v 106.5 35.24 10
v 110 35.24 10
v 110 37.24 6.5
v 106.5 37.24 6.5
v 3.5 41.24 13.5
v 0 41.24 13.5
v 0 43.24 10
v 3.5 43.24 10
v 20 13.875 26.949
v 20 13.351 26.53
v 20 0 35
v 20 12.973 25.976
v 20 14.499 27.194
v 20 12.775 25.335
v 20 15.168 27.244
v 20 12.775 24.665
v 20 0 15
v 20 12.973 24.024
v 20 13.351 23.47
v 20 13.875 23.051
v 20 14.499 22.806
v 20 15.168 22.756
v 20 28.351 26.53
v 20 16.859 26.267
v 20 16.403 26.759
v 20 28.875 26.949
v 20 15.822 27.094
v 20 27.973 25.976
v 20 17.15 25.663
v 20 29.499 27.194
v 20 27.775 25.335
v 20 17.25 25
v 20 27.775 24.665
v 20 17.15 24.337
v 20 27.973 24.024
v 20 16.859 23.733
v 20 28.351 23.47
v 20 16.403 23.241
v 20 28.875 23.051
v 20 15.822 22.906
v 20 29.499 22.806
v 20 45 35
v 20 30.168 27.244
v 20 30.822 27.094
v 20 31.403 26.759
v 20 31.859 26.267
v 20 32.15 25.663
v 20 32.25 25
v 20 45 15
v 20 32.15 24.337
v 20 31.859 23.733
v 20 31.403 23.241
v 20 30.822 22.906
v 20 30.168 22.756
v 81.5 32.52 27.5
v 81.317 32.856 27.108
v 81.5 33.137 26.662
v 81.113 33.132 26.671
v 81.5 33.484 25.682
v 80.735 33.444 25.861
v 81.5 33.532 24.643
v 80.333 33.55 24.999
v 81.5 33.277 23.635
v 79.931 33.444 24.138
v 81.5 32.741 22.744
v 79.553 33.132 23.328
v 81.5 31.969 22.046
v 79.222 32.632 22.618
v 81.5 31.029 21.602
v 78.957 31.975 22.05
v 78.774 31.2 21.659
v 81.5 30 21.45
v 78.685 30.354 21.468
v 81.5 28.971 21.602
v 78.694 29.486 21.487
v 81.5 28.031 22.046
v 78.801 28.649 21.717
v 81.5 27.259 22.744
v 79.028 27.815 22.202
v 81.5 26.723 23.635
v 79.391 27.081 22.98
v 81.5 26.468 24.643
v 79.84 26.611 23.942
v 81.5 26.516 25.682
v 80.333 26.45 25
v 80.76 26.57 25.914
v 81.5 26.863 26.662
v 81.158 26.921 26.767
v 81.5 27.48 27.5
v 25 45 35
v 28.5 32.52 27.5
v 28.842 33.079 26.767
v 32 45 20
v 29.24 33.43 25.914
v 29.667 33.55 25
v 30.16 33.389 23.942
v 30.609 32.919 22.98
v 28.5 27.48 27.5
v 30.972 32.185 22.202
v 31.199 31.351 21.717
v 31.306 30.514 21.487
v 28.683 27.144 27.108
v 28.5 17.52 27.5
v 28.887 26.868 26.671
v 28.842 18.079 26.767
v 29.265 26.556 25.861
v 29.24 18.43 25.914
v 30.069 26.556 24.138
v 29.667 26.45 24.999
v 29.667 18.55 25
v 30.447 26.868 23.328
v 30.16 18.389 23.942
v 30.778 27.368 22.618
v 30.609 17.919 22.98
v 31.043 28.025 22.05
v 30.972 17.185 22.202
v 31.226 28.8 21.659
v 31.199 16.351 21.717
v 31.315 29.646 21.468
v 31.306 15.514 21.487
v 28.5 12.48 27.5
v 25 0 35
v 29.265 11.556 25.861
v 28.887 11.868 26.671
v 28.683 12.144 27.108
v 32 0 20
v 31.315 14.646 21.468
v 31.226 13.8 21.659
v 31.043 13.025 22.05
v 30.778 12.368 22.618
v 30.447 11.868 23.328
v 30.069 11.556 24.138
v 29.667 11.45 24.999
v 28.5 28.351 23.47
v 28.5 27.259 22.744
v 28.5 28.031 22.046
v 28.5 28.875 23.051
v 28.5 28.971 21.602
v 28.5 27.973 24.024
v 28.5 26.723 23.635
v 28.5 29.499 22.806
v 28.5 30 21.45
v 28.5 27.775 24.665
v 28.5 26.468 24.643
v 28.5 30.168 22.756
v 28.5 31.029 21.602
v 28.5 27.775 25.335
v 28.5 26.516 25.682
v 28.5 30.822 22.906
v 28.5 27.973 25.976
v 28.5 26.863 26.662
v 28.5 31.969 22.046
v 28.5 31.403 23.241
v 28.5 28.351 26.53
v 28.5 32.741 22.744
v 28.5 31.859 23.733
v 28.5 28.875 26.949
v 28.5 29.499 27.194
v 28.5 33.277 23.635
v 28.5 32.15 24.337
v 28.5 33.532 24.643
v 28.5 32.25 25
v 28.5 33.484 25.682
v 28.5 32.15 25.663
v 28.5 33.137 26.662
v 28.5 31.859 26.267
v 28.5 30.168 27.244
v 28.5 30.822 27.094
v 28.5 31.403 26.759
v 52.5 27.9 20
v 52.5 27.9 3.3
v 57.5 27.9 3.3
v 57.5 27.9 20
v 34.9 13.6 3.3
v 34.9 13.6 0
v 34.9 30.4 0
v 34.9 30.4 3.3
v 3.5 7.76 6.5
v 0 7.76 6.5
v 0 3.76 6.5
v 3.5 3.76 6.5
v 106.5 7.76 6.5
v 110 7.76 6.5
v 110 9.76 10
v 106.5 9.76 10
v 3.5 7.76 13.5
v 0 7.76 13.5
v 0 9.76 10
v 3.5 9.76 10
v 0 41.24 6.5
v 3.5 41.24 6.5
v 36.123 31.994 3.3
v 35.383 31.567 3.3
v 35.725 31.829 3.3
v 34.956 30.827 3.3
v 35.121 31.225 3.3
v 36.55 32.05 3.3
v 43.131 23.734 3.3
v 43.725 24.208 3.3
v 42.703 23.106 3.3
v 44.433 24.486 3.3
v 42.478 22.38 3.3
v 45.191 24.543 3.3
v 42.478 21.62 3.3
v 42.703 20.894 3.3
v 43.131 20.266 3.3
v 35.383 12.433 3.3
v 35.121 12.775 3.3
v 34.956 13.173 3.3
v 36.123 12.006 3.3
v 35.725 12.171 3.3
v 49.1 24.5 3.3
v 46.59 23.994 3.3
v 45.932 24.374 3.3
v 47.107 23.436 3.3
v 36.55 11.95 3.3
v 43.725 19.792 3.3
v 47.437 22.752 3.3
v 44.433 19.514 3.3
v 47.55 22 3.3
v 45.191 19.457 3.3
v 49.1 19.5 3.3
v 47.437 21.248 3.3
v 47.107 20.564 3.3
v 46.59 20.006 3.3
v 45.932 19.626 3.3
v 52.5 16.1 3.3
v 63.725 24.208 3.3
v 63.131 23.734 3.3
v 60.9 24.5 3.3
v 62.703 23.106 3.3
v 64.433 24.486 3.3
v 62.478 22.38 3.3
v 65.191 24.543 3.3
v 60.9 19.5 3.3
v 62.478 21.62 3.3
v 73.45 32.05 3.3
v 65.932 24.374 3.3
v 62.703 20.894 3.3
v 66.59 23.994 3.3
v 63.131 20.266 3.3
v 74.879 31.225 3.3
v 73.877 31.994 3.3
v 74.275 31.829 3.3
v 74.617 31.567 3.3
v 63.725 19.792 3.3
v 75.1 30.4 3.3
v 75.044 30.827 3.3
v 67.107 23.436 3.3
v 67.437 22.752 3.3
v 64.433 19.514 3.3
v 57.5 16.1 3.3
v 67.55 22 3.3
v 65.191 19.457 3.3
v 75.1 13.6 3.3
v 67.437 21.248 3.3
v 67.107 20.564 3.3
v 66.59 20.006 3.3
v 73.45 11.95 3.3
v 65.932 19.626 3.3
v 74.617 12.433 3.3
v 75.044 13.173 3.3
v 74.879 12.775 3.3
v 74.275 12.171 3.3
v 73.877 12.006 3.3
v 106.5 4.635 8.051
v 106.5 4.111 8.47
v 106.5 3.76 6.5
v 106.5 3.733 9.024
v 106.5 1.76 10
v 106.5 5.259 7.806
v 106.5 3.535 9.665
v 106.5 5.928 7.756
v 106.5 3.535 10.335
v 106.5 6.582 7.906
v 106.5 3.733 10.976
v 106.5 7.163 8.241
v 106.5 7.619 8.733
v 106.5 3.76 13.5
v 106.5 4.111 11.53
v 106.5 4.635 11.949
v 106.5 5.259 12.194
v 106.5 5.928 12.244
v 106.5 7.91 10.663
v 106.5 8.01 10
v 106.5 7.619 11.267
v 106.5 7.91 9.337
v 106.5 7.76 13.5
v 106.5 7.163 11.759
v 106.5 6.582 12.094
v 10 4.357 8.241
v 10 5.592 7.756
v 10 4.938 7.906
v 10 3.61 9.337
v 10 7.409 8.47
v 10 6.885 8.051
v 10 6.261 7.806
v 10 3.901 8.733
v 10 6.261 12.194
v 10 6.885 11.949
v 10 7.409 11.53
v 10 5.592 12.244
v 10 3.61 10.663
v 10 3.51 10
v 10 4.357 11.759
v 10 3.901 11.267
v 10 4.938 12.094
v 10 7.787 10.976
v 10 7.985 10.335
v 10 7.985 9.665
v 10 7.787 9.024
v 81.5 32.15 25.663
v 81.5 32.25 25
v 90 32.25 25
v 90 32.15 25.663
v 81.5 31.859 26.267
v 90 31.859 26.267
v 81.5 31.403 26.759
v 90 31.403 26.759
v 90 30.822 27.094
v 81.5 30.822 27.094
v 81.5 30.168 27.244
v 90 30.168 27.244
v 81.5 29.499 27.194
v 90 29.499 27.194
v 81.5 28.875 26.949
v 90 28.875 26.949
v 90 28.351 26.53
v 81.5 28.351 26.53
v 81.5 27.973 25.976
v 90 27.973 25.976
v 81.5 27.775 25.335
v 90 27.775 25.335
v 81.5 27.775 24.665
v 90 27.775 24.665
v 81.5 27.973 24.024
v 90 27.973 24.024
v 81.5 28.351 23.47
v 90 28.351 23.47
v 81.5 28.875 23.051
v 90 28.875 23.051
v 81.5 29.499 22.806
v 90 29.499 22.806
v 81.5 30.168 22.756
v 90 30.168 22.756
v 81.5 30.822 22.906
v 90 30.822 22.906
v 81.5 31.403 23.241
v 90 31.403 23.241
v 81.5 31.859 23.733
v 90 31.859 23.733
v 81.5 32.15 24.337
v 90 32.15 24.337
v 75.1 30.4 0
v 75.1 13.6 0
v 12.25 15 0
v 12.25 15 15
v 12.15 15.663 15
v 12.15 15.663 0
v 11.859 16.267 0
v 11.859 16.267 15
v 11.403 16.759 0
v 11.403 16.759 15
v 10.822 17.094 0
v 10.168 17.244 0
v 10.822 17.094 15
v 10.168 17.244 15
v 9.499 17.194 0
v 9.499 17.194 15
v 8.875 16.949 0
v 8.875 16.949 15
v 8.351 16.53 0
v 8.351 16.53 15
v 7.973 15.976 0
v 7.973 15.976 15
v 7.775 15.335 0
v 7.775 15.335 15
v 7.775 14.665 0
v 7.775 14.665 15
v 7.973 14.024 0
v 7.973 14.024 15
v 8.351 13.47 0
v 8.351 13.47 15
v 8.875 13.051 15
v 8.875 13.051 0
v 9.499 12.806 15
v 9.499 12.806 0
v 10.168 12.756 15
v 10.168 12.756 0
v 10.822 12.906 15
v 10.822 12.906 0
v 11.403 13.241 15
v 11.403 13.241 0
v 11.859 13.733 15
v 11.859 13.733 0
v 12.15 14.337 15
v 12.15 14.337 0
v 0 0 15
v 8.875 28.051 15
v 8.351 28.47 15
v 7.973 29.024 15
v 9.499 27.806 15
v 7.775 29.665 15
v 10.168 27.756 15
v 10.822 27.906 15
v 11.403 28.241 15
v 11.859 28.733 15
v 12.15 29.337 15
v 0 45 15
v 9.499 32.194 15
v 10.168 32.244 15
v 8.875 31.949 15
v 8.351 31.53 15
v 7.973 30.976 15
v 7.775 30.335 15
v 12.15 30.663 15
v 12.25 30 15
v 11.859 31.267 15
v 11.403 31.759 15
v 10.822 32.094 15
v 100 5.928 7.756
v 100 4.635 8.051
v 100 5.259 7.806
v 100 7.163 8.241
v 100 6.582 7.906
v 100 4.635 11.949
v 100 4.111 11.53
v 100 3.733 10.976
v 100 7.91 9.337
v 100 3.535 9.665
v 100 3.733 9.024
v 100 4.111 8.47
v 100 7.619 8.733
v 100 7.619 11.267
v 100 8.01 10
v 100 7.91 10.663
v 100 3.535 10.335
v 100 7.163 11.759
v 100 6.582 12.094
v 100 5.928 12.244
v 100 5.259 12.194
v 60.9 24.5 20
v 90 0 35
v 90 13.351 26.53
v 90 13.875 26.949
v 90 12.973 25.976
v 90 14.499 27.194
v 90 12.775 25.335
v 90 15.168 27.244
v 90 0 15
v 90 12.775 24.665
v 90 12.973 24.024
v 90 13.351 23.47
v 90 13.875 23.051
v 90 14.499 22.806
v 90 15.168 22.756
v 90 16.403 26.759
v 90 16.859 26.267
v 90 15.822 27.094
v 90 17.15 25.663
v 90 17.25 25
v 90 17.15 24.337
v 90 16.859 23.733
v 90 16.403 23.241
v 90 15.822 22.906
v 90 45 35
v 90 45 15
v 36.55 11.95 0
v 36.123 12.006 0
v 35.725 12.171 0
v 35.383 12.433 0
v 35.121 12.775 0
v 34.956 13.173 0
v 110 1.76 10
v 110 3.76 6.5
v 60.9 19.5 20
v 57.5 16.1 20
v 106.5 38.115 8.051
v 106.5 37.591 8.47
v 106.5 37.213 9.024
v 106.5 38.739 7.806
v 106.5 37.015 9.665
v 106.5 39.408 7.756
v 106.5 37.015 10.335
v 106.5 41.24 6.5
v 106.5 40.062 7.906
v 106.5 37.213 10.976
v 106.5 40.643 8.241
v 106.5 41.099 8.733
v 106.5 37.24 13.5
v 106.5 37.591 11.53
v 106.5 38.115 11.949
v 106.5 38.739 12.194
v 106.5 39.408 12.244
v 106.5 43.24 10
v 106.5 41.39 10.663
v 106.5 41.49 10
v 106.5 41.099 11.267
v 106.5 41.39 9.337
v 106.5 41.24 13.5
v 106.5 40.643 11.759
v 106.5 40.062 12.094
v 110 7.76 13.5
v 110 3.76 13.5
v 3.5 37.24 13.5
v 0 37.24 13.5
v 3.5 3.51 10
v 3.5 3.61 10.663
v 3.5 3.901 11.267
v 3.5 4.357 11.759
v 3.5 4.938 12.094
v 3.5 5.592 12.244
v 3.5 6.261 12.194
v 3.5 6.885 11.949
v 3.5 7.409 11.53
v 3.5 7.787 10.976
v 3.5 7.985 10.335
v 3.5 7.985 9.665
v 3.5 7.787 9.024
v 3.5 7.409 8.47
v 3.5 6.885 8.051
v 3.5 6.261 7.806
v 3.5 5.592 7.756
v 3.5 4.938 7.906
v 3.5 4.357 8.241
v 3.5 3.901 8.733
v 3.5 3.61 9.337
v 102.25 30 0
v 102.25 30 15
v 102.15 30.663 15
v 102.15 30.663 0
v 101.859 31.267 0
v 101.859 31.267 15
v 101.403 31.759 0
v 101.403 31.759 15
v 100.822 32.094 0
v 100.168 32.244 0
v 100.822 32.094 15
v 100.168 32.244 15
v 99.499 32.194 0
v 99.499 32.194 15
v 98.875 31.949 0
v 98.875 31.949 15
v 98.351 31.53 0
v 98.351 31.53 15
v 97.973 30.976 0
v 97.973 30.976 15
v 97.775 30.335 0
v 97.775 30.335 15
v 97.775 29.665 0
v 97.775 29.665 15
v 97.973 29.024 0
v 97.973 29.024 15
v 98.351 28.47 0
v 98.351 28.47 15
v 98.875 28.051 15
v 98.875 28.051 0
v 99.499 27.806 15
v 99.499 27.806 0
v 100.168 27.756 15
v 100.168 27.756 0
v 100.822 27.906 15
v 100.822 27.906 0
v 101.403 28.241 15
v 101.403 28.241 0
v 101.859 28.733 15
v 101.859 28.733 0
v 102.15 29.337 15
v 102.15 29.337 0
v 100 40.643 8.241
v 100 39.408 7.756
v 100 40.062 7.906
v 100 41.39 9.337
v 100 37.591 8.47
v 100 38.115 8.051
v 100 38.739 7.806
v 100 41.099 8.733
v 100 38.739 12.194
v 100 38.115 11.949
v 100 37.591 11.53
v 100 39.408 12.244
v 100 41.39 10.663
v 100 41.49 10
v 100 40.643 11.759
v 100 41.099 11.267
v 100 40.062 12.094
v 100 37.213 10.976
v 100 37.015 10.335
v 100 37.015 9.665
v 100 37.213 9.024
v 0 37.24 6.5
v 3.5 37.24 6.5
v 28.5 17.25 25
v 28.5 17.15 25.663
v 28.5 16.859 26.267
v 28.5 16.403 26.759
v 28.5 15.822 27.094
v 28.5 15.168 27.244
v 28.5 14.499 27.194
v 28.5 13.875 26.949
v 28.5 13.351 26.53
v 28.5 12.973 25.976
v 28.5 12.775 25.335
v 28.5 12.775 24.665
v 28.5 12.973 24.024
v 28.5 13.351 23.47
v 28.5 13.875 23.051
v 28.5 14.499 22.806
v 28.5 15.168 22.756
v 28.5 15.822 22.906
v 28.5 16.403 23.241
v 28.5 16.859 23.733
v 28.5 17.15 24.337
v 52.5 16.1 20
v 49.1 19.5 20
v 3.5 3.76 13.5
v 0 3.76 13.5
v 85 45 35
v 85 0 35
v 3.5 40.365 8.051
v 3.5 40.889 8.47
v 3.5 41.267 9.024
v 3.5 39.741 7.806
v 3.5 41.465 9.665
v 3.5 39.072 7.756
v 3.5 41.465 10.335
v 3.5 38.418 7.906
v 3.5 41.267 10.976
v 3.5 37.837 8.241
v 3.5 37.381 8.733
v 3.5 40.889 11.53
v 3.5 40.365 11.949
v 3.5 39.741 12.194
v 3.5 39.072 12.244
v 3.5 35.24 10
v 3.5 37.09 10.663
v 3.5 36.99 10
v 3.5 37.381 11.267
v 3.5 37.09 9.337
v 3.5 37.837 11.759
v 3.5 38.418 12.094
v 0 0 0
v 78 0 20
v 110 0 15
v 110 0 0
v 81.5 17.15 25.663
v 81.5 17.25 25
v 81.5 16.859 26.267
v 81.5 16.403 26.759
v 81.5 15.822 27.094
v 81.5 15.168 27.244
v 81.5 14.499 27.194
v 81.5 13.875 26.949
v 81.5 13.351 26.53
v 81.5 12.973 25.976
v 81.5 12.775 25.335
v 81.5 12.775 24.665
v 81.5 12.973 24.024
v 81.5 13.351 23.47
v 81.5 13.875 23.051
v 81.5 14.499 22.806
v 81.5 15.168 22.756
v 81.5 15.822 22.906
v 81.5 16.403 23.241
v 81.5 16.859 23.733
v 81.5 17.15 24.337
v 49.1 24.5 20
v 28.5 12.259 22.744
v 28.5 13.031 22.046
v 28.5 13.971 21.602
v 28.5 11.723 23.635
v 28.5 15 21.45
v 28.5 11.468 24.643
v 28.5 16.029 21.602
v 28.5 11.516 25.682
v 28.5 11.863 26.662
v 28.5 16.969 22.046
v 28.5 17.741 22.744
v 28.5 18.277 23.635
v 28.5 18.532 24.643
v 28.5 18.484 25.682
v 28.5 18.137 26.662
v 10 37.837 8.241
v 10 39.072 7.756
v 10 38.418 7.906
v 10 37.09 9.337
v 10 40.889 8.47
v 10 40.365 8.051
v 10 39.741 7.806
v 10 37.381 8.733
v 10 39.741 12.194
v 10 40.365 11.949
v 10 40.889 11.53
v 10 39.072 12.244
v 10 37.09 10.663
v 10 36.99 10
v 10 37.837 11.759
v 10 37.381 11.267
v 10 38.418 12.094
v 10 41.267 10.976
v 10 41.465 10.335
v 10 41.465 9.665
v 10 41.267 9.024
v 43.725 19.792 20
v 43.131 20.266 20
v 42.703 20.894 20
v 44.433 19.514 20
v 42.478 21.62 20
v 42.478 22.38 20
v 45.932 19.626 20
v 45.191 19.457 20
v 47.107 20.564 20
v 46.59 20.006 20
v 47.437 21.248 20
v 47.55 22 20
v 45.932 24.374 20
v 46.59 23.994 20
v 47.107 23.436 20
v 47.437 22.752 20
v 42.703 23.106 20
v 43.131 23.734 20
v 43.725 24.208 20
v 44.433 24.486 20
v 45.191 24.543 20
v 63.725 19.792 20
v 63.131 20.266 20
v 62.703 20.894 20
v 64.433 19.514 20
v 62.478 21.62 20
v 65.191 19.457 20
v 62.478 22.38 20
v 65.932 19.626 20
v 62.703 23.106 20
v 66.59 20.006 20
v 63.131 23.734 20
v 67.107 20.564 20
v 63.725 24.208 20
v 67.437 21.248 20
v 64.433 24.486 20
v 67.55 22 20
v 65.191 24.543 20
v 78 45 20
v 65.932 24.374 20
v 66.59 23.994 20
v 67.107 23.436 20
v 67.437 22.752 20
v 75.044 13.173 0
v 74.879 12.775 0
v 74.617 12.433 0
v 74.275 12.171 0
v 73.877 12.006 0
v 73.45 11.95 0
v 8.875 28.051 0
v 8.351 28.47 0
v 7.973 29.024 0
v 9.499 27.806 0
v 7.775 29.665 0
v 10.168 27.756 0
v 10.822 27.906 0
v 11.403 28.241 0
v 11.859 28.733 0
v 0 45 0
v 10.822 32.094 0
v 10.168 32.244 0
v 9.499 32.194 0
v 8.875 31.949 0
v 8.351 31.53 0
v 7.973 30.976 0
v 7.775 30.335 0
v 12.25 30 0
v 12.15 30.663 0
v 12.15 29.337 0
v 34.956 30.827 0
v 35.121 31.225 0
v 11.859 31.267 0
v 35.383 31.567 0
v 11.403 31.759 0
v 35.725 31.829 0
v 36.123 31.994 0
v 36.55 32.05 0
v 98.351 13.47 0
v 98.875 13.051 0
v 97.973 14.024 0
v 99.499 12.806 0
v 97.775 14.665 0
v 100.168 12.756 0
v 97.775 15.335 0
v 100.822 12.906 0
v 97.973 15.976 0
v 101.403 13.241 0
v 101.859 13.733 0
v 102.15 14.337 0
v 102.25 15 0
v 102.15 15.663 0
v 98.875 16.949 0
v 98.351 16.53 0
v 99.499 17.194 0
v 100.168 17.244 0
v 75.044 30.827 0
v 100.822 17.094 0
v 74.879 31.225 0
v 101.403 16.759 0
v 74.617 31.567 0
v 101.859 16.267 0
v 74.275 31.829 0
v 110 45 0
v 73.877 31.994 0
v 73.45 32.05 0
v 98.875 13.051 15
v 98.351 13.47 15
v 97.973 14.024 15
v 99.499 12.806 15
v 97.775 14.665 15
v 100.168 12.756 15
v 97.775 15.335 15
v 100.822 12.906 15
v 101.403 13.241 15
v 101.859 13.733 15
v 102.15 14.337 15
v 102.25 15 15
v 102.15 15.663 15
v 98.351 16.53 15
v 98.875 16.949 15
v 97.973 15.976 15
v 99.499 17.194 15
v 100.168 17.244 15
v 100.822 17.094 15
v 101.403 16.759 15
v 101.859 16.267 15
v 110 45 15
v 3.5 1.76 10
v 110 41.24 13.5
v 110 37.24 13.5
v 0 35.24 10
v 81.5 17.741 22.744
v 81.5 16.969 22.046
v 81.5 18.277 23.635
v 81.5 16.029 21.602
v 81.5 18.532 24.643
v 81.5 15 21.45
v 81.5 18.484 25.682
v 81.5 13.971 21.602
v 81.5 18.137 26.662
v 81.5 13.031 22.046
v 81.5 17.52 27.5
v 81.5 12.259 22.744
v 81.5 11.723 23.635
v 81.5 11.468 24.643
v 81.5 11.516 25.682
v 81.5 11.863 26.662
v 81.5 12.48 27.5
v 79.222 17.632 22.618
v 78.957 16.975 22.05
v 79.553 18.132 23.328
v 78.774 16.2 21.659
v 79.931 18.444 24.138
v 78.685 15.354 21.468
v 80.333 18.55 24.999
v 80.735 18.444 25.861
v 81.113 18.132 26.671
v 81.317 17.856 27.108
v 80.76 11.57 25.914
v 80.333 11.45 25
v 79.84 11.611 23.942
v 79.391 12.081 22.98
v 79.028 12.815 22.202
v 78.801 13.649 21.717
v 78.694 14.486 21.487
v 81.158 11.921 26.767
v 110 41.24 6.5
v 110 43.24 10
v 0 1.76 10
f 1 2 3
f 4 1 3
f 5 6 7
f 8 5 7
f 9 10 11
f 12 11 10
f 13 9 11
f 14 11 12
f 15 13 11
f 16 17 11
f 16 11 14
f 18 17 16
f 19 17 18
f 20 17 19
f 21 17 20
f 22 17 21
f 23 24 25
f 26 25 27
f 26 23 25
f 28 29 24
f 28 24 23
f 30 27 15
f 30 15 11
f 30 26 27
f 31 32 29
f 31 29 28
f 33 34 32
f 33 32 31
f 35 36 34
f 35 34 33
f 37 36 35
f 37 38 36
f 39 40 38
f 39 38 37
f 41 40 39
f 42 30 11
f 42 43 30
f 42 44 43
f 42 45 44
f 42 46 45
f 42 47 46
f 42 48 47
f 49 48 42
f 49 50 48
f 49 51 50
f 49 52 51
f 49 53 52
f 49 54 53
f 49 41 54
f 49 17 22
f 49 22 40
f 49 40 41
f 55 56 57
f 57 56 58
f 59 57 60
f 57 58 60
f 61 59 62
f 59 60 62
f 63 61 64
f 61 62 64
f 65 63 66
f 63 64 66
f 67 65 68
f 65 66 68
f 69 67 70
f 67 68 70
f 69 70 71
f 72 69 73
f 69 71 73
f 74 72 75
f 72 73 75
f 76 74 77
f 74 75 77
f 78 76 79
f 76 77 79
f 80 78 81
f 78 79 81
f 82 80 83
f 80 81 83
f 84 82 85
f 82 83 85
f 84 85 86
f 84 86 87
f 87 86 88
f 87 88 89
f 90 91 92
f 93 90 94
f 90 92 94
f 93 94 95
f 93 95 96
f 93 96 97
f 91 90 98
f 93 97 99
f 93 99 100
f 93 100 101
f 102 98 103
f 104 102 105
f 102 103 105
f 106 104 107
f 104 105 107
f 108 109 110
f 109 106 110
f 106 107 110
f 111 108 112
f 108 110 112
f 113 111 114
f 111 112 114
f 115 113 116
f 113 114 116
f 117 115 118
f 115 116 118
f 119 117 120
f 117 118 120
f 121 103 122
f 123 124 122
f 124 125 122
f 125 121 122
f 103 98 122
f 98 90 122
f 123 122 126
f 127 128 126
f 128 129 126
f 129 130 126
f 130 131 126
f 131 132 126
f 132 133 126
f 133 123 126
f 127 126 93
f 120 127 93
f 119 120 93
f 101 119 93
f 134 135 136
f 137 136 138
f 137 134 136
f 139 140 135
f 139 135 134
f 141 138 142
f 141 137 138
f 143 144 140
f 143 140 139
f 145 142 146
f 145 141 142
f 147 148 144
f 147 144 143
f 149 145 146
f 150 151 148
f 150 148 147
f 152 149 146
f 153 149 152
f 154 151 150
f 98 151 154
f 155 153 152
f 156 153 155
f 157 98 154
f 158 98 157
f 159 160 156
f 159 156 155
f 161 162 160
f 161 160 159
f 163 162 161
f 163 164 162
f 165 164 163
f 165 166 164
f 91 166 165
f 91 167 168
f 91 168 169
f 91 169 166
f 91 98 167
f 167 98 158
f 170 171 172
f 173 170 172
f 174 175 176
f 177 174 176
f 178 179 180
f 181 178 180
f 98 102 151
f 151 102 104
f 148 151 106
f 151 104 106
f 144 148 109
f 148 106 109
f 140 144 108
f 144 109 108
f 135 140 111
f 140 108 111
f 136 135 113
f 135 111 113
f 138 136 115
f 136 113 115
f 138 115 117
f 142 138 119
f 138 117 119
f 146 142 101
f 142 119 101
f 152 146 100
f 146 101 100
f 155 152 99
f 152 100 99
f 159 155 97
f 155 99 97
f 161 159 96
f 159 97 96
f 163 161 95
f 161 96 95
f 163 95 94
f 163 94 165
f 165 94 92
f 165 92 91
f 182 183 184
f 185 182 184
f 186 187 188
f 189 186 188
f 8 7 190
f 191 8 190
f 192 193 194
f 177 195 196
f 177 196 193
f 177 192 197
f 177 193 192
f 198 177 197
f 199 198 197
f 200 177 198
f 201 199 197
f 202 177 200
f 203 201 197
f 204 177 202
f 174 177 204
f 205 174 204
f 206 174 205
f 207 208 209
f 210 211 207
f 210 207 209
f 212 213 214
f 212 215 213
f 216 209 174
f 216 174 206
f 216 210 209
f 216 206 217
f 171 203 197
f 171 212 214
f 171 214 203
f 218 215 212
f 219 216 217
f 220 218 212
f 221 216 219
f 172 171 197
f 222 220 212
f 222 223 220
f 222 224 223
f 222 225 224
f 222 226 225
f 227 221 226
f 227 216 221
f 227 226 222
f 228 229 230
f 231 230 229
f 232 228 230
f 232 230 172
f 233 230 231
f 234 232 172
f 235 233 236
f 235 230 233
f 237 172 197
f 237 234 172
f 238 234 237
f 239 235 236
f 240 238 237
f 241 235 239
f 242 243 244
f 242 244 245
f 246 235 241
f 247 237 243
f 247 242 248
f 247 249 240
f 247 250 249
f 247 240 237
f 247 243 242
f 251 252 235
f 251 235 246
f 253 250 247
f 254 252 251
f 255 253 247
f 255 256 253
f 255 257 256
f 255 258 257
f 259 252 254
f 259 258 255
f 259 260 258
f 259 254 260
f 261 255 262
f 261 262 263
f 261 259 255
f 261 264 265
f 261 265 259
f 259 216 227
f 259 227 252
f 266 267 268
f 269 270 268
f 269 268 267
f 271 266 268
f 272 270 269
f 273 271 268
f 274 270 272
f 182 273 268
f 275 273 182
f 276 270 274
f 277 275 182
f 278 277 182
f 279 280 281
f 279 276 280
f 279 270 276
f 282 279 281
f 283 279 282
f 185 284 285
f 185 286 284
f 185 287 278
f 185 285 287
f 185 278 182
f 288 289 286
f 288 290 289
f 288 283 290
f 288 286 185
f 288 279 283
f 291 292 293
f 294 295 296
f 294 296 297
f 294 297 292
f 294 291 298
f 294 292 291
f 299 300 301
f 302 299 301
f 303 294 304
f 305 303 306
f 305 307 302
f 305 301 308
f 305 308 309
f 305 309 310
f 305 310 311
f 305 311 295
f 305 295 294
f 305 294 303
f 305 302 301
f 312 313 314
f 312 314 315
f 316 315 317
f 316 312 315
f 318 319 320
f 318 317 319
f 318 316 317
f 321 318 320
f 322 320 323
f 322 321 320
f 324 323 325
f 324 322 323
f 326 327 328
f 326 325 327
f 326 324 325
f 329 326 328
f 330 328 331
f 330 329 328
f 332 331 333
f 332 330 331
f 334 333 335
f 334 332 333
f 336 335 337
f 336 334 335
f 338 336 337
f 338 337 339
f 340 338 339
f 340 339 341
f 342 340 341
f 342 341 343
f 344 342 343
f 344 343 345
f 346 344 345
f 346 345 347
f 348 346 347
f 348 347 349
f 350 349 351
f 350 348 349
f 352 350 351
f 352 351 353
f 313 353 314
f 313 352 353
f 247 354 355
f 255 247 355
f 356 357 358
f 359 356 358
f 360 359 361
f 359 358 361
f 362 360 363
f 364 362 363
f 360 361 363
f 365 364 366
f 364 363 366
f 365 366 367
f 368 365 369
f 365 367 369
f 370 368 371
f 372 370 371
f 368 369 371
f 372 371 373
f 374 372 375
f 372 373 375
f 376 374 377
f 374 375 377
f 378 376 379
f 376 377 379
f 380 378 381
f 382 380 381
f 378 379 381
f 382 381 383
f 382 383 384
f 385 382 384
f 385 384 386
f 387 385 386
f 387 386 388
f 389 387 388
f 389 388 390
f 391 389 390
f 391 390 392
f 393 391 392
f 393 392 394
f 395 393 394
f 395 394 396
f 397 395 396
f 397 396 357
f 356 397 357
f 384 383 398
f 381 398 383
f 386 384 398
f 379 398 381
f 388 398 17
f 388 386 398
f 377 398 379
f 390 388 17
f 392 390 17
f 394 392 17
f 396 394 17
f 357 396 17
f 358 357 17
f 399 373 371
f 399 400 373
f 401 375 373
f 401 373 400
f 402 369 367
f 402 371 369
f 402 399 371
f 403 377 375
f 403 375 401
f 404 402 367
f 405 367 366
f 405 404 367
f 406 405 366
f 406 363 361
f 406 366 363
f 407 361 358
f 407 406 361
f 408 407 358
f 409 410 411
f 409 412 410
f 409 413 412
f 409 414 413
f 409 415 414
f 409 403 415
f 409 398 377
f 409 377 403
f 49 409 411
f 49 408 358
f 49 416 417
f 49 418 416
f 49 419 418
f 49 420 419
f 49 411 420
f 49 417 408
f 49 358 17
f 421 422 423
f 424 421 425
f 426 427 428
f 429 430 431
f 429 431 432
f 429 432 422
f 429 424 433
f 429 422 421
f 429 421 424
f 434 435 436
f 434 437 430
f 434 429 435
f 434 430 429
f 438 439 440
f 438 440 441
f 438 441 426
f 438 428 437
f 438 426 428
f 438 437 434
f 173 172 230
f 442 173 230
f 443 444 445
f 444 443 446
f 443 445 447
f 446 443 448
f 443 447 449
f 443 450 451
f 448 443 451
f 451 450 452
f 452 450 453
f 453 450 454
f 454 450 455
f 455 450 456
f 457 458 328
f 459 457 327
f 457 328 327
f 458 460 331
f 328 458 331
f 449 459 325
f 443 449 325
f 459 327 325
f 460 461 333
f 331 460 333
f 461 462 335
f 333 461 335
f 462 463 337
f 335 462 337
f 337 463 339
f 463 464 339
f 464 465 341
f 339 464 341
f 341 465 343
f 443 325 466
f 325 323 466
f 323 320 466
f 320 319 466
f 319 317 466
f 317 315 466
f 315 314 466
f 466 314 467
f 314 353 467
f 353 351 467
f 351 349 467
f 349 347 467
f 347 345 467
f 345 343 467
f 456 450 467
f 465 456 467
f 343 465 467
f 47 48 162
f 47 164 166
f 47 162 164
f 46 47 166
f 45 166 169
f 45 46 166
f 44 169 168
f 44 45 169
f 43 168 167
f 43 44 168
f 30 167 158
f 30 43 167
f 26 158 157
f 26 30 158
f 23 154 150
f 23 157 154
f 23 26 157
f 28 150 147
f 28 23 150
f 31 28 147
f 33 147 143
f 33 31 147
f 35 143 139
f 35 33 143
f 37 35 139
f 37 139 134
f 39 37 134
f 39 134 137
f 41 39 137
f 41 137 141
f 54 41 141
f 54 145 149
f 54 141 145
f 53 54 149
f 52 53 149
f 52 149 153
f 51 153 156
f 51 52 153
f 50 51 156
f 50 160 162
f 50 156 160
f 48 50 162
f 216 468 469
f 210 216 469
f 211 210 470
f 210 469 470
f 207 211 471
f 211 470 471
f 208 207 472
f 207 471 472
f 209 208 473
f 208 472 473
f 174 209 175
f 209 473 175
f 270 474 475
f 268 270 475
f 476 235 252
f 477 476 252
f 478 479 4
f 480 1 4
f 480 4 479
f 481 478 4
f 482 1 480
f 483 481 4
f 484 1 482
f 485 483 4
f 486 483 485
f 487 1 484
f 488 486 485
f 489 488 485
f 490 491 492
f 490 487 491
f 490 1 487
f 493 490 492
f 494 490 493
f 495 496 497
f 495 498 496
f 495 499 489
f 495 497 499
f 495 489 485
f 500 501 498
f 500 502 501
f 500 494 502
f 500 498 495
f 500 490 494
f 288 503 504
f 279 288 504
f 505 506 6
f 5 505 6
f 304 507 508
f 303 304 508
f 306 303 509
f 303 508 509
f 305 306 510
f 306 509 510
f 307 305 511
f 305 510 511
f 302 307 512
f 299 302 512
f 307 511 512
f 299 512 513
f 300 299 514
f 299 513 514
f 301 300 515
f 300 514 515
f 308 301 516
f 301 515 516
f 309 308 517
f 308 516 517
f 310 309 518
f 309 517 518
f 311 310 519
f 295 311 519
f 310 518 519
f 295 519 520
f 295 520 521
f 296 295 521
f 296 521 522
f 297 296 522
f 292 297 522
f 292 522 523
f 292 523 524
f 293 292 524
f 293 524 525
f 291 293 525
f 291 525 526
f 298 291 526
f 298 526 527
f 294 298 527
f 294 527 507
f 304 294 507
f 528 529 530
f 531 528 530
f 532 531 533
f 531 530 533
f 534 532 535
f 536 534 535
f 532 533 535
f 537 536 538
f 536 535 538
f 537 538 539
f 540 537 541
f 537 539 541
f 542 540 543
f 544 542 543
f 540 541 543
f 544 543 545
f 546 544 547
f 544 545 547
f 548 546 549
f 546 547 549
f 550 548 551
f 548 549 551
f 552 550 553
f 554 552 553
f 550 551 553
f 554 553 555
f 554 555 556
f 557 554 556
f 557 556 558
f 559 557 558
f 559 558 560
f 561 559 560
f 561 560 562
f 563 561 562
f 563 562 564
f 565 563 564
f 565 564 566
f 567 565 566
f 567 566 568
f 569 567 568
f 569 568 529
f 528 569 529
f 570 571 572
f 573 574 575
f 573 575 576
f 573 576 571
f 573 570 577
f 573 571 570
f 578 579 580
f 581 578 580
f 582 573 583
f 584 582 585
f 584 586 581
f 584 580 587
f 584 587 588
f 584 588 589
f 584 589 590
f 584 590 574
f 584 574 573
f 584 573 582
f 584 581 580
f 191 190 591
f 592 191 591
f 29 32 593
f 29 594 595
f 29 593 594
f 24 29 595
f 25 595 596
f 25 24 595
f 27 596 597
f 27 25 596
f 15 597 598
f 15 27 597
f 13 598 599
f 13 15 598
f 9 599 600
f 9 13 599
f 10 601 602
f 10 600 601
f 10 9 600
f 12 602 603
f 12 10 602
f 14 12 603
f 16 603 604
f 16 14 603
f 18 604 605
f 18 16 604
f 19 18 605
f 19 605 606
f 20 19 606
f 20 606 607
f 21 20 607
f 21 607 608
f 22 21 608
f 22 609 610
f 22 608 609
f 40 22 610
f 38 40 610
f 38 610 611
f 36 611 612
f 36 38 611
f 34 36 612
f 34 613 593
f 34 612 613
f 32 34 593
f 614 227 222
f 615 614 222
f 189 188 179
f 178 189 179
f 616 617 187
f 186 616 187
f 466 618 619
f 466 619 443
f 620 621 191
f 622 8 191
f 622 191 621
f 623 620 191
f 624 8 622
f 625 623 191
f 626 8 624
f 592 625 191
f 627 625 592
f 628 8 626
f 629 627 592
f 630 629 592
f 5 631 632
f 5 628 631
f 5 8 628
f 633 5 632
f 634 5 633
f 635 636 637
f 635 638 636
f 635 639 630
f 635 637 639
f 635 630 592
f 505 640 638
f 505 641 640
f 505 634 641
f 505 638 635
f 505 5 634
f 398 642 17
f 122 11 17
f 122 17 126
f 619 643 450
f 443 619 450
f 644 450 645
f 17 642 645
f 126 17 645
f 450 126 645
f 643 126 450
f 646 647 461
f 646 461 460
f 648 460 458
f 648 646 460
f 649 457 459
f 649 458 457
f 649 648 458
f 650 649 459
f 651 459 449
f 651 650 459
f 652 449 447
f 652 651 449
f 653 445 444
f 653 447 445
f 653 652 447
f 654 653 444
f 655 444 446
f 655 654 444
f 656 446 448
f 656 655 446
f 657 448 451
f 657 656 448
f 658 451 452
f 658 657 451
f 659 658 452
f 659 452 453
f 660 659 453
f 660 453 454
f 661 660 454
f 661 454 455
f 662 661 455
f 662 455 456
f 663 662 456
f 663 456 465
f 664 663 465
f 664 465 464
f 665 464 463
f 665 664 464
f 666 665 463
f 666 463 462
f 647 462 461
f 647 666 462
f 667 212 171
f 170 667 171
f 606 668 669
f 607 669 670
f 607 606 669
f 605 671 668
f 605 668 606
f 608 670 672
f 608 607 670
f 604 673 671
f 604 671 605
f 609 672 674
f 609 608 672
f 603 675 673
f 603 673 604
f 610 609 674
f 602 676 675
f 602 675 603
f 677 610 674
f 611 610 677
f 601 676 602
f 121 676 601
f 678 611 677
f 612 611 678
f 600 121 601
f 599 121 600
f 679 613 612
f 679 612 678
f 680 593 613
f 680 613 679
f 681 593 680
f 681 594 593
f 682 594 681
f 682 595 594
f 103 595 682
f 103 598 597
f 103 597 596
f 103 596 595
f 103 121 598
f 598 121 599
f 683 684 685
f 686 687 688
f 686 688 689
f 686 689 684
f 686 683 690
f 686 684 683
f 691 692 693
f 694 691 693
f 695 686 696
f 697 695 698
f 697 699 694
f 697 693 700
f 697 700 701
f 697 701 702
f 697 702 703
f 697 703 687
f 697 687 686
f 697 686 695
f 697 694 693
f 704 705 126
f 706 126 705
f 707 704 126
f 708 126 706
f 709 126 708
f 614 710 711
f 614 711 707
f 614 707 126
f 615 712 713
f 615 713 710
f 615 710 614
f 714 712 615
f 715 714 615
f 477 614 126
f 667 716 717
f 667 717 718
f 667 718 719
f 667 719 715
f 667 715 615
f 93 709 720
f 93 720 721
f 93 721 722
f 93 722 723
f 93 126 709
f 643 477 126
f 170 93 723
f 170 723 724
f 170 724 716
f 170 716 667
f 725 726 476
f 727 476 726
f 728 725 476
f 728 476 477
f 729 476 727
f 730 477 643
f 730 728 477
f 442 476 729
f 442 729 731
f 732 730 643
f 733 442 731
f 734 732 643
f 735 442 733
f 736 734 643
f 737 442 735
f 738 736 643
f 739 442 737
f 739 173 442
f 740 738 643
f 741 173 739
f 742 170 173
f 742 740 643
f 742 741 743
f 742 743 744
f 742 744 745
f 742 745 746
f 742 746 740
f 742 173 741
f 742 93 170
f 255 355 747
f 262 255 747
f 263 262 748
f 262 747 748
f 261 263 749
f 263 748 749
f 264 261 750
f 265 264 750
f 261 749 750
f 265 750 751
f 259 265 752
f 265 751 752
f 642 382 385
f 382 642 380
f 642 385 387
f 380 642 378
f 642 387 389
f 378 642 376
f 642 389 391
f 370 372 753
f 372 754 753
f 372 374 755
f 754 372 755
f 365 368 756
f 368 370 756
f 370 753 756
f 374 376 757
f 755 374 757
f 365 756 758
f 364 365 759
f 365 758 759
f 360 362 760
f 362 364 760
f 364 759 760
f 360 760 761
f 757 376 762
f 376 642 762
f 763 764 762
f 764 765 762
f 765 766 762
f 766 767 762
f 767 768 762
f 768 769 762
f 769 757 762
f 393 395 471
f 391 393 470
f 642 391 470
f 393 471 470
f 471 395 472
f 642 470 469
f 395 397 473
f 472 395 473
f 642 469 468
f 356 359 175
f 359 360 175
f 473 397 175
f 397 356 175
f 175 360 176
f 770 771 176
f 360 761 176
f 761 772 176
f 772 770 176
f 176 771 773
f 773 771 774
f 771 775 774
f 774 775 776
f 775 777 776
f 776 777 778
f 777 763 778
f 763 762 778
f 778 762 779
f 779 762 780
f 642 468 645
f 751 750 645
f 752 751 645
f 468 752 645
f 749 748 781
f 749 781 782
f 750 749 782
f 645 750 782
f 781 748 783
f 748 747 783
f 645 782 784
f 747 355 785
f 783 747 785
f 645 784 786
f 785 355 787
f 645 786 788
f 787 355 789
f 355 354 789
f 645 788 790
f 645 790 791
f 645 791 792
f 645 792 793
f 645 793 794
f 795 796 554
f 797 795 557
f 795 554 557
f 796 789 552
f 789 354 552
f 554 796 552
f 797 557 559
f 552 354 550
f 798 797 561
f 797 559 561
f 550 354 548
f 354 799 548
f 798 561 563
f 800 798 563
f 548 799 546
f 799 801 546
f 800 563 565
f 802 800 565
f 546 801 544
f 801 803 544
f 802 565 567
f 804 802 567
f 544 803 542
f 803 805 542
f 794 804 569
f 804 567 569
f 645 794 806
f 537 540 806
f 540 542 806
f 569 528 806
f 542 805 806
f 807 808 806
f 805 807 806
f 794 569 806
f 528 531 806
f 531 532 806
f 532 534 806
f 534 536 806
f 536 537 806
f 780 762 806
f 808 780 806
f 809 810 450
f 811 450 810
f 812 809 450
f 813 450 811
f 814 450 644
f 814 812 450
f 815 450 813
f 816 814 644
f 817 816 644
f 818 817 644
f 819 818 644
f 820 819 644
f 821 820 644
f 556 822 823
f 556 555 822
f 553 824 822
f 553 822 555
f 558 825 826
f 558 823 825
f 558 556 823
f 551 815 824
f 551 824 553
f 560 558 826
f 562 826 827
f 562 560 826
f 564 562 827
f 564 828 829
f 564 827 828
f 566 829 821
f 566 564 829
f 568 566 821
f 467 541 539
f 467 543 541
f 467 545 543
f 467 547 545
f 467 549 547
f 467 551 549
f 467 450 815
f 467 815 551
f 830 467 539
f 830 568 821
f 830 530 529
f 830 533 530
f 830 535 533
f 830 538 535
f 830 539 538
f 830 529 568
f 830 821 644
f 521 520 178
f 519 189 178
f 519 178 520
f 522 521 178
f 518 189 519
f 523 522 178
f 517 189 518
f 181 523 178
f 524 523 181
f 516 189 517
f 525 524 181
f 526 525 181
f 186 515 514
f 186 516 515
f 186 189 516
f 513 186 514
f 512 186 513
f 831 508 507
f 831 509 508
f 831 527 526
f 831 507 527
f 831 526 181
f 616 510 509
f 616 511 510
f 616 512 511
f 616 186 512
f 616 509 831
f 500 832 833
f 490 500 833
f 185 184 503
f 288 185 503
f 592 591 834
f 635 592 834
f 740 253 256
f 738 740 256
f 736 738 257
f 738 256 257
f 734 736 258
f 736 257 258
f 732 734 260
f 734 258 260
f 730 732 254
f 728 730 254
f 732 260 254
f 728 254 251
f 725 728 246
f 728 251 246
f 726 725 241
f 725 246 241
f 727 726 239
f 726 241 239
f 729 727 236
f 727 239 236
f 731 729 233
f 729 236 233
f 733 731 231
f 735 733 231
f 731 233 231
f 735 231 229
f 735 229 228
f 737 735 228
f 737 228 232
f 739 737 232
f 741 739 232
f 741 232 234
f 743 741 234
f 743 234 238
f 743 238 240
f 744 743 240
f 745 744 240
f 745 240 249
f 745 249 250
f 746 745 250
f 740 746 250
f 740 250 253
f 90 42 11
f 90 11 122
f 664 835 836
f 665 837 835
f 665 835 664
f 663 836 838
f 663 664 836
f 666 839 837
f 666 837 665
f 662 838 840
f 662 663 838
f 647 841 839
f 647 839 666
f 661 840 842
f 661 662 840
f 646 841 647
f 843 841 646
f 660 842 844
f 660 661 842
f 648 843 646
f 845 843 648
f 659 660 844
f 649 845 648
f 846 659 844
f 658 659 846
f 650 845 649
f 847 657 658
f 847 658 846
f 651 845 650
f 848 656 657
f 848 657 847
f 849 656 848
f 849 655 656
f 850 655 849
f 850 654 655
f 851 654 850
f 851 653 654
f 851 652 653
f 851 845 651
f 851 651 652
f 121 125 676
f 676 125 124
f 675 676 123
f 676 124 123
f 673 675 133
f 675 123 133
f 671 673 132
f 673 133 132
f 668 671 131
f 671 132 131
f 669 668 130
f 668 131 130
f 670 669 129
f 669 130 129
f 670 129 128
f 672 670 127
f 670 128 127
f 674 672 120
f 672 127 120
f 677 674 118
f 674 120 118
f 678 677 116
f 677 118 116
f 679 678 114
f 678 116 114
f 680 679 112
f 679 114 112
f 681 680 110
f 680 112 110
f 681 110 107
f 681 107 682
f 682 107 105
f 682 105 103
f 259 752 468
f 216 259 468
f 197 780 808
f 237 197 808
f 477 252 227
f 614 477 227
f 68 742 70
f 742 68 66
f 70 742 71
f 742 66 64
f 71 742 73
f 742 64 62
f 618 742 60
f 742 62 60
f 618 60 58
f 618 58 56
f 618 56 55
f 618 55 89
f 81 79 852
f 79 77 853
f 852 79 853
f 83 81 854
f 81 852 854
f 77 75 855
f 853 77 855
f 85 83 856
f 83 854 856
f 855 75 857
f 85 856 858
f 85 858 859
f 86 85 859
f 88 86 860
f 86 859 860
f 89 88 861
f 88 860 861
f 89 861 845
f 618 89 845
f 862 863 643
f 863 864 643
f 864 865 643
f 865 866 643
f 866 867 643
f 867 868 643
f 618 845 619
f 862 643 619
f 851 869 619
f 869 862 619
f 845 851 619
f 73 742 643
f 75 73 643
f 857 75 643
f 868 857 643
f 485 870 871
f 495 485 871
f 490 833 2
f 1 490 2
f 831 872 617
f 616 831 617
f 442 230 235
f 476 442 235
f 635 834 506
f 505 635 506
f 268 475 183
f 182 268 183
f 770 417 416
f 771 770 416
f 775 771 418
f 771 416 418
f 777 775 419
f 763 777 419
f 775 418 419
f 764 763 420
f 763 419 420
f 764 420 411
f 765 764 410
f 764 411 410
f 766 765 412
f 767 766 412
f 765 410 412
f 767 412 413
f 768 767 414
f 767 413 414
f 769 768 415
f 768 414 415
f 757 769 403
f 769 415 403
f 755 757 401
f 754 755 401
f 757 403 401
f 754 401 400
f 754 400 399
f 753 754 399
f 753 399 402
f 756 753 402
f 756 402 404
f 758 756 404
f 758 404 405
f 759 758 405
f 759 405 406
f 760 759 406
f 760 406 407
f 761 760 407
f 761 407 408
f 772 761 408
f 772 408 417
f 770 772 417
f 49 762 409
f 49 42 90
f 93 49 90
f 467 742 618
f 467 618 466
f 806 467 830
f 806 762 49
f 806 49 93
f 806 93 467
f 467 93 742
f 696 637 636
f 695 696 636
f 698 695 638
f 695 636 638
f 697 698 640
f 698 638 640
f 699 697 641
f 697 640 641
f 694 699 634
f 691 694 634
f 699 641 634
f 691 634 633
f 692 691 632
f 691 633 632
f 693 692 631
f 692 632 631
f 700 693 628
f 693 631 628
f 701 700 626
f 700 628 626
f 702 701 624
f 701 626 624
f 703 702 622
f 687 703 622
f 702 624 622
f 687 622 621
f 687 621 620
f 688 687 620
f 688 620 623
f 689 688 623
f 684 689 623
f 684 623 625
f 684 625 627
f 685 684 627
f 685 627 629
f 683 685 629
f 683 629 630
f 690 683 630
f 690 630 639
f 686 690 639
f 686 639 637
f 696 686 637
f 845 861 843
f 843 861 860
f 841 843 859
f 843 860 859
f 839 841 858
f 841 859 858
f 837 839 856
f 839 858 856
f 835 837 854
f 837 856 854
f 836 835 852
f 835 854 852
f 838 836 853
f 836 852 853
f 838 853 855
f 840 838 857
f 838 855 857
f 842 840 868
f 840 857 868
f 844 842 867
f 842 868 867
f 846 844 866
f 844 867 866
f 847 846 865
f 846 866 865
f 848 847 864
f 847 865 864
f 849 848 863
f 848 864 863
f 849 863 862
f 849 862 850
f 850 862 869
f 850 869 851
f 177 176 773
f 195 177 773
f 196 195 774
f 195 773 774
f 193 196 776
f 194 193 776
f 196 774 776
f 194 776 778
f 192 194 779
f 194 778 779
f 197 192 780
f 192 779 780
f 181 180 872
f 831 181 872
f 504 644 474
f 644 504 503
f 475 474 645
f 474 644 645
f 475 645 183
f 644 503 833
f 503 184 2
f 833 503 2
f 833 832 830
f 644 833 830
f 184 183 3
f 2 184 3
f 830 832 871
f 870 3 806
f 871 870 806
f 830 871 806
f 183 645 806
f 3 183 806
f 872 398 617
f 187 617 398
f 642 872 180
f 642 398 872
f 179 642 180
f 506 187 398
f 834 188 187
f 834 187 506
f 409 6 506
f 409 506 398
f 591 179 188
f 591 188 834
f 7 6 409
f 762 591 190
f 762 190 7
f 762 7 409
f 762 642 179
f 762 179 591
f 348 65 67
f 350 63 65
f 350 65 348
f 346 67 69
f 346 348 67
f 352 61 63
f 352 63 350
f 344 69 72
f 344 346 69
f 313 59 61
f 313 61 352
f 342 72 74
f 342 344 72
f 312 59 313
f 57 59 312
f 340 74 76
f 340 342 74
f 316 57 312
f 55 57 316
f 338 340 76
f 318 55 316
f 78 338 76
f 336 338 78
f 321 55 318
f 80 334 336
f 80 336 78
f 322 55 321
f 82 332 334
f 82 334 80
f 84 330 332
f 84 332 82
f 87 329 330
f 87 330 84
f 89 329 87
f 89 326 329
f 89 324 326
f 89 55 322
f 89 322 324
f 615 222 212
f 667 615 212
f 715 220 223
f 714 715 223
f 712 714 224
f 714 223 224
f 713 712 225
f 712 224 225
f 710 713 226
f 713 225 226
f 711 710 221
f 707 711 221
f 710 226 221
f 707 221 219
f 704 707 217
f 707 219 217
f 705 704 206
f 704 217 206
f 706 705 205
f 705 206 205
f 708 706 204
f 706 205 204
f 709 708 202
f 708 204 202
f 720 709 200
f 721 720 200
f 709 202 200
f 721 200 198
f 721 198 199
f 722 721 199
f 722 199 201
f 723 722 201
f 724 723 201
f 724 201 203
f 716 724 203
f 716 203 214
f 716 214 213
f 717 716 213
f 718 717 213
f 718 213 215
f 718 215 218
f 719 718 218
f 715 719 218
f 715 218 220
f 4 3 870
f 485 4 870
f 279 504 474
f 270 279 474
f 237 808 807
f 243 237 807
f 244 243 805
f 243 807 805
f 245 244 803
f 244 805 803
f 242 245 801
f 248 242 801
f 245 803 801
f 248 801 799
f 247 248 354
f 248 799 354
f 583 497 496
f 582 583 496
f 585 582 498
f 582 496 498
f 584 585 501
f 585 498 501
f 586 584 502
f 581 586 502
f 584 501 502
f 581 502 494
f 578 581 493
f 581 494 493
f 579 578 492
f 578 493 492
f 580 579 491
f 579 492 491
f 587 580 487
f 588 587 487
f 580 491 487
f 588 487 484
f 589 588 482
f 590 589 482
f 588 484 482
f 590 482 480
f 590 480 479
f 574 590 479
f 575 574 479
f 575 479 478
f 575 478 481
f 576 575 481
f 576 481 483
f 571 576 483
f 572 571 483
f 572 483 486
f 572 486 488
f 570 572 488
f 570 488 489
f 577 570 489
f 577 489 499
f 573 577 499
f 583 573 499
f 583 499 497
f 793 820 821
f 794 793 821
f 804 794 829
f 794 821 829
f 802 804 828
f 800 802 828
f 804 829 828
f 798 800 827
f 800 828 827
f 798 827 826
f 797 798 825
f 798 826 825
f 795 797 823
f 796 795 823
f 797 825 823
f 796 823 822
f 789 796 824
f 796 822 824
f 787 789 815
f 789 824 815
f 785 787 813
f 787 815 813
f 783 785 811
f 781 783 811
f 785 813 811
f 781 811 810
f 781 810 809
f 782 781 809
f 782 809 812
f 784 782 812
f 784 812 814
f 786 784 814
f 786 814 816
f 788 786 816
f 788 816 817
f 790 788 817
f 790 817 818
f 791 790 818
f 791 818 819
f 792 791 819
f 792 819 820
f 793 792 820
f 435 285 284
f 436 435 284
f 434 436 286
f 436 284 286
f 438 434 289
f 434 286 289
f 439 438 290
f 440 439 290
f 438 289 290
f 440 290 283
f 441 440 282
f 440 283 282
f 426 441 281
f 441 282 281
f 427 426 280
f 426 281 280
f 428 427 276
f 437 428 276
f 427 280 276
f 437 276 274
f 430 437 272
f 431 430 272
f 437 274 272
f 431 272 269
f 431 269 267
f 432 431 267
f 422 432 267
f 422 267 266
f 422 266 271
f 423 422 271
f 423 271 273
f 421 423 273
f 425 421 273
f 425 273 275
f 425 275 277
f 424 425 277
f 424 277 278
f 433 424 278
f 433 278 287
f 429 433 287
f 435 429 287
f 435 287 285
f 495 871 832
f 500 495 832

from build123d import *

# Parameters (mm, degrees)
F0_W      = 110
F0_H      = 45
F1_DEPTH  = 15
F2_W      = 12
F2_H      = 45
F3_DEPTH  = 20
F4_R      = 2.25
F5_DEPTH  = 110.001
F6_R      = 2.25
F7_DEPTH  = 15.001
F8_R      = 2.25
F9_DEPTH  = 15.001
F10_R     = 3.55
F11_DEPTH = 3.5
F12_R     = 3.55
F13_DEPTH = 3.5
F3_FACE_W = 46
F3_FACE_H = 45
F14_DEPTH = 5
F16_DEPTH = 45.001
F17_R     = 2.55
F18_DEPTH = 35.001
F20_DEPTH = 3.3
F21_R     = 2.25
F22_DEPTH = 10
F24_DEPTH = 3.5
F25_R     = 2.25
F26_DEPTH = 10
F28_DEPTH = 3.5


with BuildPart() as f1:
    # F0 (on Top) → F1 (new body)
    with BuildSketch(Plane.XY):
        with Locations((55, 22.5)):
            Rectangle(F0_W, F0_H)
    extrude(amount=F1_DEPTH)

    # F2 (on face) → F3 (join)
    with BuildSketch(Plane.XY.offset(15)):
        with Locations((26, 22.5)):
            Rectangle(F2_W, F2_H)
        with Locations((84, 22.5)):
            Rectangle(F2_W, F2_H)
    extrude(amount=F3_DEPTH)

    # F4 (on Right) → F5 (cut, through all)
    with BuildSketch(Plane.YZ):
        with Locations((15, 25)):
            Circle(F4_R)
        with Locations((30, 25)):
            Circle(F4_R)
    extrude(amount=F5_DEPTH, mode=Mode.SUBTRACT)

    # F6 (on face) → F7 (cut, through all)
    with BuildSketch(Plane.XY.offset(15)):
        with Locations((10, 30)):
            Circle(F6_R)
        with Locations((10, 15)):
            Circle(F6_R)
    extrude(amount=-F7_DEPTH, mode=Mode.SUBTRACT)

    # F8 (on face) → F9 (cut, through all)
    with BuildSketch(Plane.XY.offset(15)):
        with Locations((100, 30)):
            Circle(F8_R)
        with Locations((100, 15)):
            Circle(F8_R)
    extrude(amount=-F9_DEPTH, mode=Mode.SUBTRACT)

    # F10 (on face) → F11 (cut)
    with BuildSketch(Plane(origin=(78, 0, 0), x_dir=(0, -1, 0), z_dir=(-1, 0, 0))):
        with Locations((-30, 25)):
            Circle(F10_R)
        with Locations((-15, 25)):
            Circle(F10_R)
    extrude(amount=-F11_DEPTH, mode=Mode.SUBTRACT)

    # F12 (on face) → F13 (cut)
    with BuildSketch(Plane.YZ.offset(32)):
        with Locations((15, 25)):
            Circle(F12_R)
        with Locations((30, 25)):
            Circle(F12_R)
    extrude(amount=-F13_DEPTH, mode=Mode.SUBTRACT)

    # F3_face (on face) → F14 (join)
    with BuildSketch(Plane(origin=(55, 22.5, 15), x_dir=(1, 0, 0), z_dir=(0, 0, 1))):
        Rectangle(F3_FACE_W, F3_FACE_H)
    extrude(amount=F14_DEPTH)

    # F15 (on face) → F16 (cut, through all)
    with BuildSketch(Plane.XZ):
        Polygon((32, 20), (32, 35), (25, 35), align=None)
        Polygon((85, 35), (78, 35), (78, 20), align=None)
    extrude(amount=-F16_DEPTH, mode=Mode.SUBTRACT)

    # F17 (on face) → F18 (cut, through all)
    with BuildSketch(Plane(origin=(0, 0, 0), x_dir=(1, 0, 0), z_dir=(0, 0, -1))):
        Polygon((57.5, -16.1), (55, -16.1), (52.5, -16.1), (49.1, -19.5), (49.1, -22), (49.1, -24.5), (52.5, -27.9), (55, -27.9), (57.5, -27.9), (60.9, -24.5), (60.9, -22), (60.9, -19.5), align=None)
        with Locations((45, -22)):
            Circle(F17_R)
        with Locations((65, -22)):
            Circle(F17_R)
    extrude(amount=-F18_DEPTH, mode=Mode.SUBTRACT)

    # F19 (on face) → F20 (cut)
    with BuildSketch(Plane(origin=(0, 0, 0), x_dir=(1, 0, 0), z_dir=(0, 0, -1))):
        with BuildLine():
            Line((73.45, -11.95), (55, -11.95))
            Line((55, -11.95), (36.55, -11.95))
            ThreePointArc((36.55, -11.95), (35.383274, -12.433274), (34.9, -13.6))
            Line((34.9, -13.6), (34.9, -30.4))
            ThreePointArc((34.9, -30.4), (35.383274, -31.566726), (36.55, -32.05))
            Line((36.55, -32.05), (73.45, -32.05))
            ThreePointArc((73.45, -32.05), (74.616726, -31.566726), (75.1, -30.4))
            Line((75.1, -30.4), (75.1, -13.6))
            ThreePointArc((75.1, -13.6), (74.616726, -12.433274), (73.45, -11.95))
        make_face()
    extrude(amount=-F20_DEPTH, mode=Mode.SUBTRACT)

    # F21 (on face) → F22 (cut)
    with BuildSketch(Plane(origin=(0, 0, 0), x_dir=(0, -1, 0), z_dir=(-1, 0, 0))):
        with Locations((-39.24, 10)):
            Circle(F21_R)
        with Locations((-5.76, 10)):
            Circle(F21_R)
    extrude(amount=-F22_DEPTH, mode=Mode.SUBTRACT)

    # F23 (on face) → F24 (cut)
    with BuildSketch(Plane(origin=(0, 0, 0), x_dir=(0, -1, 0), z_dir=(-1, 0, 0))):
        Polygon((-37.24, 13.5), (-39.24, 13.5), (-41.24, 13.5), (-43.24, 10), (-41.24, 6.5), (-39.24, 6.5), (-37.24, 6.5), (-35.24, 10), align=None)
        Polygon((-3.76, 13.5), (-5.76, 13.5), (-7.76, 13.5), (-9.76, 10), (-7.76, 6.5), (-5.76, 6.5), (-3.76, 6.5), (-1.76, 10), align=None)
    extrude(amount=-F24_DEPTH, mode=Mode.SUBTRACT)

    # F25 (on face) → F26 (cut)
    with BuildSketch(Plane.YZ.offset(110)):
        with Locations((5.76, 10)):
            Circle(F25_R)
        with Locations((39.24, 10)):
            Circle(F25_R)
    extrude(amount=-F26_DEPTH, mode=Mode.SUBTRACT)

    # F27 (on face) + F25 (on face) → F28 (cut)
    with BuildSketch(Plane.YZ.offset(110)):
        Polygon((7.76, 13.5), (5.76, 13.5), (3.76, 13.5), (1.76, 10), (3.76, 6.5), (5.76, 6.5), (7.76, 6.5), (9.76, 10), align=None)
        Polygon((37.24, 6.5), (39.24, 6.5), (41.24, 6.5), (43.24, 10), (41.24, 13.5), (39.24, 13.5), (37.24, 13.5), (35.24, 10), align=None)
    with BuildSketch(Plane.YZ.offset(110)):
        with Locations((5.76, 10)):
            Circle(F25_R)
        with Locations((39.24, 10)):
            Circle(F25_R)
    extrude(amount=-F28_DEPTH, mode=Mode.SUBTRACT)


solid = f1.part
